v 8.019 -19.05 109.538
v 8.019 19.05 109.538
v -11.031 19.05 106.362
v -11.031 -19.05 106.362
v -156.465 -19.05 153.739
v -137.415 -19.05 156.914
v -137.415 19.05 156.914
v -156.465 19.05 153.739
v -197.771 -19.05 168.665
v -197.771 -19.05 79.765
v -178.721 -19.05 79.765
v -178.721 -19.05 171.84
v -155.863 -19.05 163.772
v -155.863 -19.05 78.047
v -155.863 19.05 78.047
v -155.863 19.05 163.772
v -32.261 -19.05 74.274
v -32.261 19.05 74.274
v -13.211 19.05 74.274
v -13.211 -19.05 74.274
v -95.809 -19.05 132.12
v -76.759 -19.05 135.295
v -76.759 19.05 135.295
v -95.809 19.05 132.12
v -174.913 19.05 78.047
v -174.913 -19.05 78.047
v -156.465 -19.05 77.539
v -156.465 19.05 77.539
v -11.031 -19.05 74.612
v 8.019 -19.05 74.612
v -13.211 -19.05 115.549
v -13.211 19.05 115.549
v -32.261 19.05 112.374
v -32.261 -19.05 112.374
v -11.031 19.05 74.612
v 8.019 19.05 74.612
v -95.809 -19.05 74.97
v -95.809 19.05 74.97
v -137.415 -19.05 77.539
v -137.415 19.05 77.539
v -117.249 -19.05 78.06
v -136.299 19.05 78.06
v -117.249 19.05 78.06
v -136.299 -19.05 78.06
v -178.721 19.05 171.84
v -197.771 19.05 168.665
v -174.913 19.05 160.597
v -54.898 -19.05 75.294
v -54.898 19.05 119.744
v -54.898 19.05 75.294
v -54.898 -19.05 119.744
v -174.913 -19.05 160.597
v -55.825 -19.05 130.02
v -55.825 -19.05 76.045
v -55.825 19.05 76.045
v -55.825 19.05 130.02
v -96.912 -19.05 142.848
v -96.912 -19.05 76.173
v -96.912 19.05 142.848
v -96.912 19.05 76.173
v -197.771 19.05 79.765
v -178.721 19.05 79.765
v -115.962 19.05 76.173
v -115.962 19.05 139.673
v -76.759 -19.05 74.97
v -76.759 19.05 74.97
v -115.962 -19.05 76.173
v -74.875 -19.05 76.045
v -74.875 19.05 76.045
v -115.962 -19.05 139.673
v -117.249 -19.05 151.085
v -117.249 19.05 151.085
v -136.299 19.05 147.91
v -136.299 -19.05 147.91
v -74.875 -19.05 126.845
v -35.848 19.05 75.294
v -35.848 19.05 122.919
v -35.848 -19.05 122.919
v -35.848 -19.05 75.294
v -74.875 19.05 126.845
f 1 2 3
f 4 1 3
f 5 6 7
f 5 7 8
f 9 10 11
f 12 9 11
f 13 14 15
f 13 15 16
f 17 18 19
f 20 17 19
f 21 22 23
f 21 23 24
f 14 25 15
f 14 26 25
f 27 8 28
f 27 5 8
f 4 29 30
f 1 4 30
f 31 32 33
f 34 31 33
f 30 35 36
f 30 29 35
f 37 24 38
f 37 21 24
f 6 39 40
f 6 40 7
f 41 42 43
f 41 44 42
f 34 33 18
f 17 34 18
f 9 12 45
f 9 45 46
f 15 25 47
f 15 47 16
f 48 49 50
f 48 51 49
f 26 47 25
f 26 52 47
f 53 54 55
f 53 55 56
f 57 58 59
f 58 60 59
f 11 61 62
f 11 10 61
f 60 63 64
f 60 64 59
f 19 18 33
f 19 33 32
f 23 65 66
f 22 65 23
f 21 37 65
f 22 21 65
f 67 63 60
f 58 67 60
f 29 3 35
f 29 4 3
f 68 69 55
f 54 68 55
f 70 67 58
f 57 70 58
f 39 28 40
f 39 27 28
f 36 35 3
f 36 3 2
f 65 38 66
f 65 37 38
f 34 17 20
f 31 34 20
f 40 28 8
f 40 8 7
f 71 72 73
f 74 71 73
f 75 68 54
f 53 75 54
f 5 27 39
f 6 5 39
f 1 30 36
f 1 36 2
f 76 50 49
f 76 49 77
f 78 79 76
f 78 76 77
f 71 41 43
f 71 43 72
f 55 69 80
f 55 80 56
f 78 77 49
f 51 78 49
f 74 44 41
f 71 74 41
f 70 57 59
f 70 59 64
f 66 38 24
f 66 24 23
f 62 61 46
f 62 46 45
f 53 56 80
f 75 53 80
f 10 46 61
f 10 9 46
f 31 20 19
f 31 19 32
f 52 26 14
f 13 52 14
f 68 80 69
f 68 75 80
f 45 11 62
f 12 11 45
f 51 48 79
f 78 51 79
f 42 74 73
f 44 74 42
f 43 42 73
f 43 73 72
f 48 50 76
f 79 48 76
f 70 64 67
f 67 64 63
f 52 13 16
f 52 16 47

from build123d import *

# Parameters (mm, degrees)
F10_DEPTH = 19.05
F11_DEPTH = 19.05
F12_DEPTH = 19.05
F13_DEPTH = 19.05
F14_DEPTH = 19.05
F15_DEPTH = 19.05
F16_DEPTH = 19.05
F17_DEPTH = 19.05
F18_DEPTH = 19.05


with BuildPart() as f10:
    # F0 (on Front) → F10 (new body, symmetric)
    with BuildSketch(Plane.XZ):
        Polygon((-11.030553, 74.6125), (8.019447, 74.6125), (8.019447, 109.5375), (-11.030553, 106.3625), align=None)
    extrude(amount=F10_DEPTH, both=True)


with BuildPart() as f11:
    # F6 (on Front) → F11 (new body, symmetric)
    with BuildSketch(Plane.XZ):
        Polygon((-32.261007, 74.274459), (-13.211007, 74.274459), (-13.211007, 115.549459), (-32.261007, 112.374459), align=None)
    extrude(amount=F11_DEPTH, both=True)


with BuildPart() as f12:
    # F1 (on Front) → F12 (new body, symmetric)
    with BuildSketch(Plane.XZ):
        Polygon((-54.897833, 75.293961), (-35.847833, 75.293961), (-35.847833, 122.918961), (-54.897833, 119.743961), align=None)
    extrude(amount=F12_DEPTH, both=True)


with BuildPart() as f13:
    # F7 (on face) → F13 (new body, symmetric)
    with BuildSketch(Plane.XZ):
        Polygon((-74.874855, 76.044659), (-55.824855, 76.044659), (-55.824855, 130.019659), (-74.874855, 126.844659), align=None)
    extrude(amount=F13_DEPTH, both=True)


with BuildPart() as f14:
    # F2 (on Front) → F14 (new body, symmetric)
    with BuildSketch(Plane.XZ):
        Polygon((-95.808676, 74.970192), (-76.758676, 74.970192), (-76.758676, 135.295192), (-95.808676, 132.120192), align=None)
    extrude(amount=F14_DEPTH, both=True)


with BuildPart() as f15:
    # F3 (on Front) + F4 (on Front) → F15 (new body, symmetric)
    with BuildSketch(Plane.XZ):
        Polygon((-115.96167, 76.172568), (-96.91167, 76.172568), (-96.91167, 142.847568), (-115.96167, 139.672568), align=None)
    with BuildSketch(Plane.XZ):
        Polygon((-136.299475, 78.059622), (-117.249475, 78.059622), (-117.249475, 151.084622), (-136.299475, 147.909622), align=None)
    extrude(amount=F15_DEPTH, both=True)


with BuildPart() as f16:
    # F5 (on Front) → F16 (new body, symmetric)
    with BuildSketch(Plane.XZ):
        Polygon((-156.464933, 77.538876), (-137.414933, 77.538876), (-137.414933, 156.913876), (-156.464933, 153.738876), align=None)
    extrude(amount=F16_DEPTH, both=True)


with BuildPart() as f17:
    # F8 (on Front) → F17 (new body, symmetric)
    with BuildSketch(Plane.XZ):
        Polygon((-174.913419, 78.047216), (-155.863419, 78.047216), (-155.863419, 163.772216), (-174.913419, 160.597216), align=None)
    extrude(amount=F17_DEPTH, both=True)


with BuildPart() as f18:
    # F9 (on Front) → F18 (new body, symmetric)
    with BuildSketch(Plane.XZ):
        Polygon((-197.771453, 79.765112), (-178.721453, 79.765112), (-178.721453, 171.840112), (-197.771453, 168.665112), align=None)
    extrude(amount=F18_DEPTH, both=True)


solid = Compound([f10.part, f11.part, f12.part, f13.part, f14.part, f15.part, f16.part, f17.part, f18.part])
